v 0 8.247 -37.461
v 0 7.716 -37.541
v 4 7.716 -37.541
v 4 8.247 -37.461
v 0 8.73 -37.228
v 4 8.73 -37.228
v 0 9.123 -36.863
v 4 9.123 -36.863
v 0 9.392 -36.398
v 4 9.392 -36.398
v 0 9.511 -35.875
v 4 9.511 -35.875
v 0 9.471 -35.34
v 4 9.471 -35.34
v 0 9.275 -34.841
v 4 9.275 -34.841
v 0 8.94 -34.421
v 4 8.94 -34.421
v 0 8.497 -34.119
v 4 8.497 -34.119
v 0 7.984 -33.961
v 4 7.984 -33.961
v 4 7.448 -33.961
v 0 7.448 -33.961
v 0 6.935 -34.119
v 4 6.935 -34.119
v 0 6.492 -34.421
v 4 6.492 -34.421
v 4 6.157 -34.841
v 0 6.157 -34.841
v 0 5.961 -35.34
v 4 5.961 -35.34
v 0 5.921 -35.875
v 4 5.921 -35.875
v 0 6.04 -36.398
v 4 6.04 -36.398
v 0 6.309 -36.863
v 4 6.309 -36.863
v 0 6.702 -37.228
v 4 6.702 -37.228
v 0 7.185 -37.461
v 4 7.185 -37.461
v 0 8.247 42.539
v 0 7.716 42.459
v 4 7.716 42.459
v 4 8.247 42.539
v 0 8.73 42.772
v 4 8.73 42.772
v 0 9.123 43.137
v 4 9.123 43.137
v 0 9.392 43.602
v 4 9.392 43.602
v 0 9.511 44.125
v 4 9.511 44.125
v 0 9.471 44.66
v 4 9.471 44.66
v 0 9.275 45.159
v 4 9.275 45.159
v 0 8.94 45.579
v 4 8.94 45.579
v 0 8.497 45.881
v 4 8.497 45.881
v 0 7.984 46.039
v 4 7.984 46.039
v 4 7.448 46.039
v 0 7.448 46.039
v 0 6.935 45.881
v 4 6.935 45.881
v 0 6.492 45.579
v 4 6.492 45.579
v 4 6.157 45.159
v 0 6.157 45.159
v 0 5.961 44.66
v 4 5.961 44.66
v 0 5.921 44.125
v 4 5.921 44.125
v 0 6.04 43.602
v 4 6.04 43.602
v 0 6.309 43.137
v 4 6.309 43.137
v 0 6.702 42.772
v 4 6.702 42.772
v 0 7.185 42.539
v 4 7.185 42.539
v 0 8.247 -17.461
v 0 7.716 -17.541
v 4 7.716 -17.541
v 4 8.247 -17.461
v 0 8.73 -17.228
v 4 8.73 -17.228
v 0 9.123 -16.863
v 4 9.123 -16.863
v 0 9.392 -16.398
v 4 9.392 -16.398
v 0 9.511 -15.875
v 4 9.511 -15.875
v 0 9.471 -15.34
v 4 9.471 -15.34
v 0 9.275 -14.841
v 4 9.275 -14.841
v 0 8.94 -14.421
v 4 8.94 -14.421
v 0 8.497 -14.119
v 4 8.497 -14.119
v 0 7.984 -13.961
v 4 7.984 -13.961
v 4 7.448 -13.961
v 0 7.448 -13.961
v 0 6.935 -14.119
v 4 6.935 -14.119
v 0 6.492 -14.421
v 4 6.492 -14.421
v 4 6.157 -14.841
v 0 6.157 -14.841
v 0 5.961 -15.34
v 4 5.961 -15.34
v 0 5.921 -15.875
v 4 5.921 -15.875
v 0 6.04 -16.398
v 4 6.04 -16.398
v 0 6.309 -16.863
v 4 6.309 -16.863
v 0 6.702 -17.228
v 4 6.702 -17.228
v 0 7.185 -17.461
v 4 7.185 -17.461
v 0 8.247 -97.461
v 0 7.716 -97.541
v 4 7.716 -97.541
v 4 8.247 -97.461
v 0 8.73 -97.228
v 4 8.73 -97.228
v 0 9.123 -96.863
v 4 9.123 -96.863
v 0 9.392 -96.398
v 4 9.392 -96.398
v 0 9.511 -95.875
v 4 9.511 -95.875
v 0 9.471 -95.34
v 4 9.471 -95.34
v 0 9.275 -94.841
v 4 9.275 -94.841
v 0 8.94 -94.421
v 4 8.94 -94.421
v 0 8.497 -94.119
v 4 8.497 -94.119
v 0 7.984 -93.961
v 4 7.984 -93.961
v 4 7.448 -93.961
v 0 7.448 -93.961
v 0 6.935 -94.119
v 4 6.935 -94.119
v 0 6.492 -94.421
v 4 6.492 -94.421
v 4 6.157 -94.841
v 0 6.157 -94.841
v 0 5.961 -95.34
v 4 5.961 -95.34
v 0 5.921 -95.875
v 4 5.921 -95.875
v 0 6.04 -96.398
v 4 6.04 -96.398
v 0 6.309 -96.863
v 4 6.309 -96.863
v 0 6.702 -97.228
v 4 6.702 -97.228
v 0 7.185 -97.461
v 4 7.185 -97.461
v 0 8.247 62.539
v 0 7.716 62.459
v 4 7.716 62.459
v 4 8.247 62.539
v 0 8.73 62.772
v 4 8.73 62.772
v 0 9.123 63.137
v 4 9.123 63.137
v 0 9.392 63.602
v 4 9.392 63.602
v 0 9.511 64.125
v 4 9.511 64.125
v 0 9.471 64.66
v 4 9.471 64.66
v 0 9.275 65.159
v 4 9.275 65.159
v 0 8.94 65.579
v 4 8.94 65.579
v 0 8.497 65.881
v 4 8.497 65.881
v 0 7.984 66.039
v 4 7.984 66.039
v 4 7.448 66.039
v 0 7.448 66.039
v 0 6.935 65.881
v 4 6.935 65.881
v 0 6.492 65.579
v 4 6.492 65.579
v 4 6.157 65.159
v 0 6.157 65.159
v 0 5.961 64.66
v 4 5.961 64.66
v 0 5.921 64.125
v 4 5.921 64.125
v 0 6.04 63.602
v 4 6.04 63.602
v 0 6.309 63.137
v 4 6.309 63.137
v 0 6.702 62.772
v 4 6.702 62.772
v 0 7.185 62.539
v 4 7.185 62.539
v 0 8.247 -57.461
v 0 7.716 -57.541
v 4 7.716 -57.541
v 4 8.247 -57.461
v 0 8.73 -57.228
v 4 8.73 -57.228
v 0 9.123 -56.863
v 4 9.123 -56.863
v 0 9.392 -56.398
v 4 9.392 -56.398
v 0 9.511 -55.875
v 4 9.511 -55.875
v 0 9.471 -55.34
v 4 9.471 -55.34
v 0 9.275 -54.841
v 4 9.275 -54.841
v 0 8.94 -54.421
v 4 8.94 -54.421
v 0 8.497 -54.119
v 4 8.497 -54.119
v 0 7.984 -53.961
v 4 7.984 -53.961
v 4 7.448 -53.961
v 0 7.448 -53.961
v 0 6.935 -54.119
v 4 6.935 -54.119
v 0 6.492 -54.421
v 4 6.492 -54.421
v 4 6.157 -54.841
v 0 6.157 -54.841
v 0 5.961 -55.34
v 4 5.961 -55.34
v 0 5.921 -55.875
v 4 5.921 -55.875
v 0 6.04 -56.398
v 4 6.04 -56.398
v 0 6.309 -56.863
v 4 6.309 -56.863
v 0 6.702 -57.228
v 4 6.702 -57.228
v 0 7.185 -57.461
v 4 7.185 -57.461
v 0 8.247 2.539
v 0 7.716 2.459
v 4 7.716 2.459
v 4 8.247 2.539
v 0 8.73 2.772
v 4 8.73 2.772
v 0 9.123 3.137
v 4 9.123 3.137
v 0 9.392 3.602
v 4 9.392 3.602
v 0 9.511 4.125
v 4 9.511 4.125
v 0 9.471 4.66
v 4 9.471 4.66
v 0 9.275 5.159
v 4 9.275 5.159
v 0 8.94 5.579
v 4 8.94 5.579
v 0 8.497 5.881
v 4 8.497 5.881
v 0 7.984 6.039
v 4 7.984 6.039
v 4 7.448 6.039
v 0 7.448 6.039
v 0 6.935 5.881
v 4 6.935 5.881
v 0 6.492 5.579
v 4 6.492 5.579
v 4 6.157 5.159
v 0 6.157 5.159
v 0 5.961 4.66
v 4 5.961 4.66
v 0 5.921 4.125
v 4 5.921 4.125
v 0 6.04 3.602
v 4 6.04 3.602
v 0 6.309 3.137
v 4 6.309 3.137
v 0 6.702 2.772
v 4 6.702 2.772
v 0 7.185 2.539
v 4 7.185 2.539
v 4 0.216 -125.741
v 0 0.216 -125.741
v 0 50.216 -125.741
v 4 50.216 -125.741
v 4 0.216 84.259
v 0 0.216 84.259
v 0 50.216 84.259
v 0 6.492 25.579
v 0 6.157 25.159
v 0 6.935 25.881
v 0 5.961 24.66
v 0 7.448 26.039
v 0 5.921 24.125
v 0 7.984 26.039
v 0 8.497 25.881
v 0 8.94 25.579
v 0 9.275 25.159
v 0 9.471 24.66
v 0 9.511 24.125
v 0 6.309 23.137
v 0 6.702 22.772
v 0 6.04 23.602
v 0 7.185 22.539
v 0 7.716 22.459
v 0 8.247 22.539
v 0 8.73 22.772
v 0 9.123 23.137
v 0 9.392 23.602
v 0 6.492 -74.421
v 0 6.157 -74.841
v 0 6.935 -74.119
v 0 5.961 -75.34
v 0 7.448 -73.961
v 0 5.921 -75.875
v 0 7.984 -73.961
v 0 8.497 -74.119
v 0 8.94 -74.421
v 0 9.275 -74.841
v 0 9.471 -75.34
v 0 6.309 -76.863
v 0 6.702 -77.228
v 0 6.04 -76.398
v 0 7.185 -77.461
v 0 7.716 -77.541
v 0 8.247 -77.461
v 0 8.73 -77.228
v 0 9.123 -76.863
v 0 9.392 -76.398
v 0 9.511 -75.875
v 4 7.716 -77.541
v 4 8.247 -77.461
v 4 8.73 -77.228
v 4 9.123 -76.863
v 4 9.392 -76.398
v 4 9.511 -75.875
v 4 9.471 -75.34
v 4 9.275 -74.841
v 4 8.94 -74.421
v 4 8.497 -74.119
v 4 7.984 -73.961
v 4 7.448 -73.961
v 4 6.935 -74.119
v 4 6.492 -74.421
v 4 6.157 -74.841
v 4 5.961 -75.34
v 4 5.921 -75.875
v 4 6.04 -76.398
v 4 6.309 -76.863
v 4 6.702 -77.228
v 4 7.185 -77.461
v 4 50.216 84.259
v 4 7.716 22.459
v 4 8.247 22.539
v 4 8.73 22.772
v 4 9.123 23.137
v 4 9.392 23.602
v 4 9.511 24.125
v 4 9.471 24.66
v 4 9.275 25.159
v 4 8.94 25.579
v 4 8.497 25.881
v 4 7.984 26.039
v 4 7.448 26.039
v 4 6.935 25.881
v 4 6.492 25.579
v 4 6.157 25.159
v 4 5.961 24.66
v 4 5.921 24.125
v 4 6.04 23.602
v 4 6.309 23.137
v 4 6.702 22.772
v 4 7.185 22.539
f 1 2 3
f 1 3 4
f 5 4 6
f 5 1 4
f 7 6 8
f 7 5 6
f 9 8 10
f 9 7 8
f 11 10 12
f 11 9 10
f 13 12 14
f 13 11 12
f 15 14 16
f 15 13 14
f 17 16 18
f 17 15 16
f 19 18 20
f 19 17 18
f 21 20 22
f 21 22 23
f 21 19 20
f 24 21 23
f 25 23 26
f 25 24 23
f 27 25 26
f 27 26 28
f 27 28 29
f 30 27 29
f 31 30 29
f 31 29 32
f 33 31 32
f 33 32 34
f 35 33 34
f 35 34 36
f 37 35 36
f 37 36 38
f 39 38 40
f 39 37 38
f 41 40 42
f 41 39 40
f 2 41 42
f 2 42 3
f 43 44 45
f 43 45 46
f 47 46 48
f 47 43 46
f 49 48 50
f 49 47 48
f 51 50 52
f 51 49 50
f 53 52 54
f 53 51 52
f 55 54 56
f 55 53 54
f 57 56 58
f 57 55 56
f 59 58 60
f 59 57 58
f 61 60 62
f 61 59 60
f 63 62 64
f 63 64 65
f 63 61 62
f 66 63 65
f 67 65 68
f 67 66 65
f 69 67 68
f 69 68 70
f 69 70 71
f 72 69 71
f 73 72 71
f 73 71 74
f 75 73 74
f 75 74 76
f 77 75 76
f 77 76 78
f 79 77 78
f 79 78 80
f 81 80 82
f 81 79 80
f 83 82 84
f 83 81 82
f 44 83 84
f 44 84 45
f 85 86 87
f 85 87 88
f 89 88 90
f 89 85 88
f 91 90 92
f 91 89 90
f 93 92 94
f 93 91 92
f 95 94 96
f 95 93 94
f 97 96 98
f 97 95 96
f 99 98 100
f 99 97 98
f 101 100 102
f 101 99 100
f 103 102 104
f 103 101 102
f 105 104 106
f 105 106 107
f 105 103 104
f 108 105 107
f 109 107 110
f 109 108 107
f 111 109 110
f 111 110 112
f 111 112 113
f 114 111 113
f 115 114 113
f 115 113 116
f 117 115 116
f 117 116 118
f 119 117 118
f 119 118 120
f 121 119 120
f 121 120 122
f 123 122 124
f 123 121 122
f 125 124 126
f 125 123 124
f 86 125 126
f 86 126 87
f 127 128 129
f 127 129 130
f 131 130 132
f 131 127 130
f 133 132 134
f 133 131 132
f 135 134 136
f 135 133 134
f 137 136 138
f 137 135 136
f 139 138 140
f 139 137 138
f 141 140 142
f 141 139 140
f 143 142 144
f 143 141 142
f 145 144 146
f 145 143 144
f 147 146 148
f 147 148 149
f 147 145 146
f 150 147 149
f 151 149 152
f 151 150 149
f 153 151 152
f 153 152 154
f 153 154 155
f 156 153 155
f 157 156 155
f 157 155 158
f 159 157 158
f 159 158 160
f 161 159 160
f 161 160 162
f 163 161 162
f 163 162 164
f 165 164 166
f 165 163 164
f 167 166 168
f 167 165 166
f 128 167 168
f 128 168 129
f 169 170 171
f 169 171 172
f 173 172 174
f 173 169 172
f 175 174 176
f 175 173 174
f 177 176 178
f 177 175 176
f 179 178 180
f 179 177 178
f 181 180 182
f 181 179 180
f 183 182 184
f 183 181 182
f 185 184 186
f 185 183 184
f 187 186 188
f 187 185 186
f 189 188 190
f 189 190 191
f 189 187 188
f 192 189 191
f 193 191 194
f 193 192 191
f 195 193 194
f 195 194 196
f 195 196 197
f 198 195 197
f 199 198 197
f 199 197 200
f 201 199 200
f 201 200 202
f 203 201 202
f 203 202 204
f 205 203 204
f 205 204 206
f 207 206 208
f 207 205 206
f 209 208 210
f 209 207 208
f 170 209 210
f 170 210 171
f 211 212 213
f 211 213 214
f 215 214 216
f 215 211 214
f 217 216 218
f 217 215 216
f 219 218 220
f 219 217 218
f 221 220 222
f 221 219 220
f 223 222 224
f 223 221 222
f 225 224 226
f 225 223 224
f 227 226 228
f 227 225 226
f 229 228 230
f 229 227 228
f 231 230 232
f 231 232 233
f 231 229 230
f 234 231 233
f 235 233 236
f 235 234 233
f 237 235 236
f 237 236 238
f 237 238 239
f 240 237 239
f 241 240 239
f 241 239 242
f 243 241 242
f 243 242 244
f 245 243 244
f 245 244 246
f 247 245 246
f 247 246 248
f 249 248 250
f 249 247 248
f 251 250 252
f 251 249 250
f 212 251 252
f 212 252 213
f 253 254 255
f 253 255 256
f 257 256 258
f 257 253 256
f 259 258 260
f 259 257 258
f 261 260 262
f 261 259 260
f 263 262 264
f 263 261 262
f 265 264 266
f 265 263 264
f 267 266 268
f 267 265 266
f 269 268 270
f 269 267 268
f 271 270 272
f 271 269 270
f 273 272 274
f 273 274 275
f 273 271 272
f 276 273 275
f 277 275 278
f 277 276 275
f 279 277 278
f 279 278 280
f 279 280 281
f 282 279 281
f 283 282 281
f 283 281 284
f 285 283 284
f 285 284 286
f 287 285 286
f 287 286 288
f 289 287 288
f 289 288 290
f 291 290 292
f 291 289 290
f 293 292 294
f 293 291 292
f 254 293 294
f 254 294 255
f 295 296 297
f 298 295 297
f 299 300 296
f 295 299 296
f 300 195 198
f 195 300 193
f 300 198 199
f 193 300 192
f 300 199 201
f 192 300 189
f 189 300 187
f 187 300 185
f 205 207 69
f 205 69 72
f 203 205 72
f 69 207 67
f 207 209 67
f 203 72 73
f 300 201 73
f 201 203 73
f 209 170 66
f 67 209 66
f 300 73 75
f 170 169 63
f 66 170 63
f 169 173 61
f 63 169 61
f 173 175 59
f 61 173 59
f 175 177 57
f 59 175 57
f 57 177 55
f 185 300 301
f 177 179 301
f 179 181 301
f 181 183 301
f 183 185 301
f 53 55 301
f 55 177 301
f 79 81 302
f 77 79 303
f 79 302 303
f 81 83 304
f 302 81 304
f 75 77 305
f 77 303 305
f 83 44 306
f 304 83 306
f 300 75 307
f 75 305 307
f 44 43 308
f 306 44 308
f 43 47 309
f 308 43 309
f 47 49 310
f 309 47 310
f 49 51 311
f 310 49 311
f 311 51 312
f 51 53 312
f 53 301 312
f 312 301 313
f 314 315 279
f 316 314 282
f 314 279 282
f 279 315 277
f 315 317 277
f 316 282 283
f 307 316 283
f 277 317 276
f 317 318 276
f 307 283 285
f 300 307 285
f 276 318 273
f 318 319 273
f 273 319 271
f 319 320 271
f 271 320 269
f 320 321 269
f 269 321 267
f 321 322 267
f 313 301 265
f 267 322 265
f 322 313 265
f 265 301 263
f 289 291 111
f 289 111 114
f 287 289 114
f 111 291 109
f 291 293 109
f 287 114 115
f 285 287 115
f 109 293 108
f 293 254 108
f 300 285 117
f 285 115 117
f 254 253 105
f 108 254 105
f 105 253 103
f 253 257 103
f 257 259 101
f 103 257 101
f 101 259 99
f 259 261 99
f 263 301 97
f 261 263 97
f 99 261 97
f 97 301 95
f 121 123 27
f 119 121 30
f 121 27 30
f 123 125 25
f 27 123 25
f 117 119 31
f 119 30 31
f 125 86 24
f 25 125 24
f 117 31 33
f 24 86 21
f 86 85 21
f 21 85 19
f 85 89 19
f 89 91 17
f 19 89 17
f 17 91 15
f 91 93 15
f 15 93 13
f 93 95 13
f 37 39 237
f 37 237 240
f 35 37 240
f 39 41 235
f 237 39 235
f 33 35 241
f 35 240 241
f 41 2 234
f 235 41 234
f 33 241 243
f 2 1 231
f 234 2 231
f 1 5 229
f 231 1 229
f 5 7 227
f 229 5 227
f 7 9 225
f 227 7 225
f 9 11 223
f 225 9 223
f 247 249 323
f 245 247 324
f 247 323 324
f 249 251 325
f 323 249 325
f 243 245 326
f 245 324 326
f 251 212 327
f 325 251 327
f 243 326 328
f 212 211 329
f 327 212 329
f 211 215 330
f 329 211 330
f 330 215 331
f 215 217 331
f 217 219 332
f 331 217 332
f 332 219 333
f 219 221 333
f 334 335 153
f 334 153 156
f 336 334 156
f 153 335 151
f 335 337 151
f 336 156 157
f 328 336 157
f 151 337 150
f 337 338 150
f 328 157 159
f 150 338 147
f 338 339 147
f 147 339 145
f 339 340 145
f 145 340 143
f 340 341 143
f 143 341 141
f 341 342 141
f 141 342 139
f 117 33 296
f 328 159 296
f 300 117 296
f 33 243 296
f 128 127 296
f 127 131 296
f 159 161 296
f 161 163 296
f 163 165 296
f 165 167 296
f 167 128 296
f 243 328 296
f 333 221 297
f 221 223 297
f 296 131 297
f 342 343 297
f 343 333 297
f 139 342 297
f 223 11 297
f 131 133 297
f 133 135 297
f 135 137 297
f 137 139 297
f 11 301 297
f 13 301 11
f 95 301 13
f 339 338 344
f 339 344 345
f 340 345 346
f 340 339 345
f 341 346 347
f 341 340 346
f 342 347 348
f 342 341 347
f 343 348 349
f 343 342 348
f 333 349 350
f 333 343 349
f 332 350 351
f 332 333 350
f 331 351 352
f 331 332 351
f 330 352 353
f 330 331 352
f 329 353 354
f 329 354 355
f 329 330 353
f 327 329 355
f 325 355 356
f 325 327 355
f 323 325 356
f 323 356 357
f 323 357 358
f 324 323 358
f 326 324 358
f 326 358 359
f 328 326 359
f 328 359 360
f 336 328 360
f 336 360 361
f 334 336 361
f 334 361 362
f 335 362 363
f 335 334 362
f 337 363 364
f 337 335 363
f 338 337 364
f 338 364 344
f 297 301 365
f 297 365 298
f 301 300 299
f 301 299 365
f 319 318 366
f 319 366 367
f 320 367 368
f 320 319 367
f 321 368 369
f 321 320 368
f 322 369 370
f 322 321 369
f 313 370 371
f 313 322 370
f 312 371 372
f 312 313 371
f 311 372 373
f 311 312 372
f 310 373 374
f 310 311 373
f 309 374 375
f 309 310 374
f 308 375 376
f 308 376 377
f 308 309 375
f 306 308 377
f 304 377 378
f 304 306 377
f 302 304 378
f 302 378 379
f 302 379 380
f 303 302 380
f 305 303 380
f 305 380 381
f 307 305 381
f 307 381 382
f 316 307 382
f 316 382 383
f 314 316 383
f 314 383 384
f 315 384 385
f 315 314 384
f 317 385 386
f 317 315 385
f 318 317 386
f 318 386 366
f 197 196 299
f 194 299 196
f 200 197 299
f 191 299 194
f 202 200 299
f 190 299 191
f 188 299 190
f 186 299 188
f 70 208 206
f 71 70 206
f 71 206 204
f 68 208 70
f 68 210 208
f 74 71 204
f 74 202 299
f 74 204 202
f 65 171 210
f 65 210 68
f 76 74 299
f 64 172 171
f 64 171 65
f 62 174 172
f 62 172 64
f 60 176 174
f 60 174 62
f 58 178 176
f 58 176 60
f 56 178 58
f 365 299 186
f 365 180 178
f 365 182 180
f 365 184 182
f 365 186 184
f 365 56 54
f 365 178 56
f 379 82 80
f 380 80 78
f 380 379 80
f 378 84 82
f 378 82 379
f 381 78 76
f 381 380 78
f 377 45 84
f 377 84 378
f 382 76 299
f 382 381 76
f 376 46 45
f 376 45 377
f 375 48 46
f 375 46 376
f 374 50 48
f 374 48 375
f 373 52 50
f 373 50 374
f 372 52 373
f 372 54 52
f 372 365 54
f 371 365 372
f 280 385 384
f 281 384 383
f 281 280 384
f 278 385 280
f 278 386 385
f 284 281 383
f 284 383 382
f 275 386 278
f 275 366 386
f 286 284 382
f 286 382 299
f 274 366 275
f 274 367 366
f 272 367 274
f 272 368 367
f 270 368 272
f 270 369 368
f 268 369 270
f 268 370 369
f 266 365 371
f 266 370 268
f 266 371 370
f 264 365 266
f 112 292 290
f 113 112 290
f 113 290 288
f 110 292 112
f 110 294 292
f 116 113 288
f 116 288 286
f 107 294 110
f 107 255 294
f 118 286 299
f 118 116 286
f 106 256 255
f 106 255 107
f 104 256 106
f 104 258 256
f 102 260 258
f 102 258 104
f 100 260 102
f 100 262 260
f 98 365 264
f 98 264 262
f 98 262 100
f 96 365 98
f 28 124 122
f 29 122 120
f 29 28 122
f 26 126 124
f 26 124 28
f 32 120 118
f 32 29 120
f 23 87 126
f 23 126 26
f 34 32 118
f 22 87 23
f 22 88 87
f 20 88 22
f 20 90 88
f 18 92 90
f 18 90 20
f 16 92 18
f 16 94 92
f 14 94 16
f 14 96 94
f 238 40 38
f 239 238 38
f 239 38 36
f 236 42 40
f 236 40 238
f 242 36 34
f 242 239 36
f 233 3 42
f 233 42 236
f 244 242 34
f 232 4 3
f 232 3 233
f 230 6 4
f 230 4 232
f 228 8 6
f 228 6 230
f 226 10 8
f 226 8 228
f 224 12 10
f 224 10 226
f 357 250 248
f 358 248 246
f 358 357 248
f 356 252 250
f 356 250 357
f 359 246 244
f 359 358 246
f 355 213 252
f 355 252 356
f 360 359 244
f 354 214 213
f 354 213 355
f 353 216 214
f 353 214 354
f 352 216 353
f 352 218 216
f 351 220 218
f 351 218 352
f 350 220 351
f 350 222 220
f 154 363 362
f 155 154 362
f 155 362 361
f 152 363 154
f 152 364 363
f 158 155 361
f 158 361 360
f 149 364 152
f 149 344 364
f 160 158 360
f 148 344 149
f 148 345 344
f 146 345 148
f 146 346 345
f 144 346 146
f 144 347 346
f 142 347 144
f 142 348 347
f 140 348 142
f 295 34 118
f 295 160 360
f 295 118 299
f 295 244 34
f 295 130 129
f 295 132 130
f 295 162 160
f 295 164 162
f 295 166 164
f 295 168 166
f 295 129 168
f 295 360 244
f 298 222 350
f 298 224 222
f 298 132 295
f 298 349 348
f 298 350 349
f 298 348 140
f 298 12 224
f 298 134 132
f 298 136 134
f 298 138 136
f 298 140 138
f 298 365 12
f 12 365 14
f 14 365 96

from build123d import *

# Parameters (mm, degrees)
SKETCH2_W           = 210
SKETCH2_H           = 50
SKETCH2_R           = 1.8
BOSS_EXTRUDE1_DEPTH = 4


with BuildPart() as part:
    # Sketch2 → Boss-Extrude1 (new body)
    with BuildSketch(Plane(origin=(0, 0, 0), x_dir=(0, 0, -1), z_dir=(1, 0, 0))):
        with Locations((20.740740741, 25.216049383)):
            Rectangle(SKETCH2_W, SKETCH2_H)
        with Locations((-64.259259259, 7.716049383)):
            Circle(SKETCH2_R, mode=Mode.SUBTRACT)
        with Locations((-44.259259259, 7.716049383)):
            Circle(SKETCH2_R, mode=Mode.SUBTRACT)
        with Locations((-24.259259259, 7.716049383)):
            Circle(SKETCH2_R, mode=Mode.SUBTRACT)
        with Locations((-4.259259259, 7.716049383)):
            Circle(SKETCH2_R, mode=Mode.SUBTRACT)
        with Locations((15.740740741, 7.716049383)):
            Circle(SKETCH2_R, mode=Mode.SUBTRACT)
        with Locations((35.740740741, 7.716049383)):
            Circle(SKETCH2_R, mode=Mode.SUBTRACT)
        with Locations((55.740740741, 7.716049383)):
            Circle(SKETCH2_R, mode=Mode.SUBTRACT)
        with Locations((75.740740741, 7.716049383)):
            Circle(SKETCH2_R, mode=Mode.SUBTRACT)
        with Locations((95.740740741, 7.716049383)):
            Circle(SKETCH2_R, mode=Mode.SUBTRACT)
    extrude(amount=BOSS_EXTRUDE1_DEPTH)


solid = part.part
